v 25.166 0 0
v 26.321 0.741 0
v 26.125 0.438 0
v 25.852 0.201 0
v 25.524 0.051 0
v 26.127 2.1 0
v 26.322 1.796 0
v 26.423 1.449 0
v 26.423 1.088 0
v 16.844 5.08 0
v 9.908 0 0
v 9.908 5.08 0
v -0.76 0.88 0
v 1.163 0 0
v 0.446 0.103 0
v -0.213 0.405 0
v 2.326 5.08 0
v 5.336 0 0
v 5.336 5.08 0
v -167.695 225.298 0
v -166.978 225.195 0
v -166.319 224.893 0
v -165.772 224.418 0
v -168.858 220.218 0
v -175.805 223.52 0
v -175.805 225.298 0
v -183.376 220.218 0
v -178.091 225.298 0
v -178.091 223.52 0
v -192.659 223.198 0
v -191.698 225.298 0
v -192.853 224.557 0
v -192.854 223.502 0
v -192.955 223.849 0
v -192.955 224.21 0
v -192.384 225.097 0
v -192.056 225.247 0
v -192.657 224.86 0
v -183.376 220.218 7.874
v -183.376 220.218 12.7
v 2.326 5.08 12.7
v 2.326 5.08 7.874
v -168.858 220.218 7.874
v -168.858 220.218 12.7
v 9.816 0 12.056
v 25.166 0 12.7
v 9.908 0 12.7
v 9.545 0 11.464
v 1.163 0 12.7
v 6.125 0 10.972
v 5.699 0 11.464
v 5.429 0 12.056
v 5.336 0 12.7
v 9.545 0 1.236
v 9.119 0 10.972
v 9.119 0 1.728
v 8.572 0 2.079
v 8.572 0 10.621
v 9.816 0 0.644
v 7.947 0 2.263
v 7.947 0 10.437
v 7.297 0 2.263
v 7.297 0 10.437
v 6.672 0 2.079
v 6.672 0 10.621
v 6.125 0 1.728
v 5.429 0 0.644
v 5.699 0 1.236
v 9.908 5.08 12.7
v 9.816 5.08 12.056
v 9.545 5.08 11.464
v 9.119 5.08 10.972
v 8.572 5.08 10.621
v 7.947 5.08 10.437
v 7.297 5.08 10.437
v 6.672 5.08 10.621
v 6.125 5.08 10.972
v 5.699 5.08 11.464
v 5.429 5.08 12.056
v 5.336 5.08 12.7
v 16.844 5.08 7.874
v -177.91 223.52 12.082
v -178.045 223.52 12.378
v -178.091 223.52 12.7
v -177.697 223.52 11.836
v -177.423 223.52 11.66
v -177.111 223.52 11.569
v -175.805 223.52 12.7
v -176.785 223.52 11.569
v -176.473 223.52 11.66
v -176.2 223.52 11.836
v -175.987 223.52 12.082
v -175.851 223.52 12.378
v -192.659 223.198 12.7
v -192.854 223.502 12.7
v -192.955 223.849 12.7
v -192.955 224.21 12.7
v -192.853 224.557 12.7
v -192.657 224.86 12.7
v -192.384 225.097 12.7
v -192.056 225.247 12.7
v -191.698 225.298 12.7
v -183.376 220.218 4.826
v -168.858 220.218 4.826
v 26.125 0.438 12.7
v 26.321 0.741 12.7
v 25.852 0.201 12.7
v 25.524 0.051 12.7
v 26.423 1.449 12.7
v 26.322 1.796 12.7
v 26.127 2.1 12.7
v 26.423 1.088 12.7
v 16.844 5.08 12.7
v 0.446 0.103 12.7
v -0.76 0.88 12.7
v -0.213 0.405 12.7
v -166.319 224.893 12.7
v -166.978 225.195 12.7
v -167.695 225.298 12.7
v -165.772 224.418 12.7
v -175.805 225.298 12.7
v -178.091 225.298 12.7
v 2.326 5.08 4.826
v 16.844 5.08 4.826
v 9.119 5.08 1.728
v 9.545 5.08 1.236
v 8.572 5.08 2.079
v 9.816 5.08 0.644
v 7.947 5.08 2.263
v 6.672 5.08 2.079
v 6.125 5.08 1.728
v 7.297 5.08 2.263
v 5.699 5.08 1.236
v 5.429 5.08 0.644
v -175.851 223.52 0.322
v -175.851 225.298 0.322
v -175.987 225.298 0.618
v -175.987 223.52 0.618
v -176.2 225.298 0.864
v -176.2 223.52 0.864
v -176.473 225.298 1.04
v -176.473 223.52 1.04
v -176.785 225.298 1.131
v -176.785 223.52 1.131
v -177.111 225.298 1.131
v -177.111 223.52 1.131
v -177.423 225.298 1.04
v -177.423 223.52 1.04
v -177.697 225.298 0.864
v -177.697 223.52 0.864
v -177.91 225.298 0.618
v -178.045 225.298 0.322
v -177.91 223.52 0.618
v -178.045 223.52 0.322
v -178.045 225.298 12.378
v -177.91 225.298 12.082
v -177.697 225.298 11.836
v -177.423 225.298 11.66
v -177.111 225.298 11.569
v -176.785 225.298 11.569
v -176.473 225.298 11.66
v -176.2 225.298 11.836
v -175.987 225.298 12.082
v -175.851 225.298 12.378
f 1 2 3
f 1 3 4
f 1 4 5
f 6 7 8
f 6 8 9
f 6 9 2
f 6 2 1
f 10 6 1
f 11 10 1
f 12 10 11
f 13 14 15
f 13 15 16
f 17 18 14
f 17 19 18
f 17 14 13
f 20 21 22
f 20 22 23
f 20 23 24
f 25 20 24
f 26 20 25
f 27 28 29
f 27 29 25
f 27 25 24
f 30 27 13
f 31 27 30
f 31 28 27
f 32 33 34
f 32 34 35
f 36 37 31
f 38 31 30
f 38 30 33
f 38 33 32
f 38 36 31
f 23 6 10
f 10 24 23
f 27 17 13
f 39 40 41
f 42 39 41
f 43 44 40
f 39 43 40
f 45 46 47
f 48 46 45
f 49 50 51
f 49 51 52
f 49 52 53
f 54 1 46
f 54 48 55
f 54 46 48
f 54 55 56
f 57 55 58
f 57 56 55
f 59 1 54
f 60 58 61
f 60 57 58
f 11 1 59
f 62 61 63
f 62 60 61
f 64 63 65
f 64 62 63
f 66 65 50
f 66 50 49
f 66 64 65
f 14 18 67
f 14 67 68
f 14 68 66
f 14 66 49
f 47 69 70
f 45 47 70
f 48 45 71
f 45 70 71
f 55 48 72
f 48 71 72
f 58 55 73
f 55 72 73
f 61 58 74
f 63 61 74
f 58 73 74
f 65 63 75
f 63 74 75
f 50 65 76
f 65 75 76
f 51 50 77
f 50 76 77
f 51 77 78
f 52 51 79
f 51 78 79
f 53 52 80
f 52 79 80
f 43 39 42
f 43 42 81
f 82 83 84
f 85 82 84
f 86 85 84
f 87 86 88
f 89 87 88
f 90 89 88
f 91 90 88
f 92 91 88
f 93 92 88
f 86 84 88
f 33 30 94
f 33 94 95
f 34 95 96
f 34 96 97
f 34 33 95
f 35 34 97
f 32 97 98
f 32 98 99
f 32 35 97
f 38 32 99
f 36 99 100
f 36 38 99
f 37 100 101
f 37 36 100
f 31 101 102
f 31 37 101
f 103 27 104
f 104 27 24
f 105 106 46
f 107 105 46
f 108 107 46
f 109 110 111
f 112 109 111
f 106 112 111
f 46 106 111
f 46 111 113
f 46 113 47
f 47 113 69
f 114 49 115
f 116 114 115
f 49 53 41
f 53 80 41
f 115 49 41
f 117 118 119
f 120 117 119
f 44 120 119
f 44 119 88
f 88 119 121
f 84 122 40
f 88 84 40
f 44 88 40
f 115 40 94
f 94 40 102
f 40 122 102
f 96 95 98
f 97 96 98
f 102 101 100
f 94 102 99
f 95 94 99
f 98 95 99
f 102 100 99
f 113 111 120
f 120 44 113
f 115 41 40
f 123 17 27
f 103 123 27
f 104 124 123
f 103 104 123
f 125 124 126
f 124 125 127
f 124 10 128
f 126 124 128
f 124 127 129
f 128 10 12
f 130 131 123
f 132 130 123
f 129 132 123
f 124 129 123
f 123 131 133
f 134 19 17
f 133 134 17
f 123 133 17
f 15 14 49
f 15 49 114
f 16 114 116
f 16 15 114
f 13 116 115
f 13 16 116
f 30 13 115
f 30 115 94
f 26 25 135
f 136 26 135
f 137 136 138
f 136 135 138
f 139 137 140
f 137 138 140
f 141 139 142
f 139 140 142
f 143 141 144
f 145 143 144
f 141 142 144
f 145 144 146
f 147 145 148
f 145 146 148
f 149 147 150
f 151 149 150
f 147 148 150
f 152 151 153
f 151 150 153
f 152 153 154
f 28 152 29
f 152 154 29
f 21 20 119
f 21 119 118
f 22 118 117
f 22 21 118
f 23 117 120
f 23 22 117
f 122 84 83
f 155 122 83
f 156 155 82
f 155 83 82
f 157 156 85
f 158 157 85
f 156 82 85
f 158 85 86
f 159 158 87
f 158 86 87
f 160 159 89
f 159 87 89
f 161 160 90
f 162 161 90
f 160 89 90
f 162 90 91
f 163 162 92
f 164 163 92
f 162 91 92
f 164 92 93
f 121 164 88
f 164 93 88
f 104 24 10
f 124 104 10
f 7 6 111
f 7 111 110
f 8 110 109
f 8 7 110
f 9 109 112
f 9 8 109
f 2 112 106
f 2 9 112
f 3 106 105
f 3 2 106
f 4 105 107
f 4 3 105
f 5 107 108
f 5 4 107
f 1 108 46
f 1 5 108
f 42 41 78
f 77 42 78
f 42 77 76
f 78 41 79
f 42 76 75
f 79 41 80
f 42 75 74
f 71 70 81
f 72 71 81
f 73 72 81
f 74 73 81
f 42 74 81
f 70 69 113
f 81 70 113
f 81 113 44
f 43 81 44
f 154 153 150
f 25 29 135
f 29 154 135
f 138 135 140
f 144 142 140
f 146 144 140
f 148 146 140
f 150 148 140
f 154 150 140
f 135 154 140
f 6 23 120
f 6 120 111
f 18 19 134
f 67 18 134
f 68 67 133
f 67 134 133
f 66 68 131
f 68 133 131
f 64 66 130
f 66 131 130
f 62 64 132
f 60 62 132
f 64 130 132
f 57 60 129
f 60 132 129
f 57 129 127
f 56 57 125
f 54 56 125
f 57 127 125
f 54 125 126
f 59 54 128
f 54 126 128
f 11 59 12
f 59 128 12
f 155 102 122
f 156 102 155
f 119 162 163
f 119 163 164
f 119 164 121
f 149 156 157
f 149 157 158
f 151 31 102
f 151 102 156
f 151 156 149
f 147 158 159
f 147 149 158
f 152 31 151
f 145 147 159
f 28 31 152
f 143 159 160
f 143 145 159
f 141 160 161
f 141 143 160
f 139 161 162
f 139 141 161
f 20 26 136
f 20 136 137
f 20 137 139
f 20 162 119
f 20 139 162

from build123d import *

# Parameters (mm, degrees)
BOSS_EXTRUDE1_DEPTH = 12.7
CUT_EXTRUDE1_DEPTH  = 4.826
CUT_EXTRUDE2_DEPTH  = 4.826
SKETCH5_R           = 1.143
CUT_EXTRUDE3_DEPTH  = 296.565841373
SKETCH6_R           = 2.286
CUT_EXTRUDE4_DEPTH  = 294.076685716


with BuildPart() as part:
    # Sketch1 → Boss-Extrude1 (new body)
    with BuildSketch(Plane.XY):
        with BuildLine():
            Line((-0.759864647, 0.880311666), (-192.659480012, 223.198155833))
            ThreePointArc((-192.659480012, 223.198155833), (-192.85282615, 224.556676606), (-191.698096292, 225.298))
            Line((-191.698096292, 225.298), (-167.694919671, 225.298))
            ThreePointArc((-167.694919671, 225.298), (-166.637566458, 225.067459717), (-165.772152229, 224.417688334))
            Line((-165.772152229, 224.417688334), (26.127463136, 2.099844167))
            ThreePointArc((26.127463136, 2.099844167), (26.320809274, 0.741323394), (25.166079416, 0))
            Line((25.166079416, 0), (1.162902795, 0))
            ThreePointArc((1.162902795, 0), (0.105549582, 0.230540283), (-0.759864647, 0.880311666))
        make_face()
    extrude(amount=BOSS_EXTRUDE1_DEPTH)

    # Sketch3 → Cut-Extrude1 (cut)
    with BuildSketch(Plane.XY.offset(12.7)):
        Polygon((-183.376334539, 220.218), (2.32580559, 5.08), (16.844317663, 5.08), (-168.857822466, 220.218), align=None)
    extrude(amount=-CUT_EXTRUDE1_DEPTH, mode=Mode.SUBTRACT)

    # Sketch4 → Cut-Extrude2 (cut)
    with BuildSketch(Plane(origin=(0, 0, 0), x_dir=(-1, 0, 0), z_dir=(0, 0, -1))):
        Polygon((183.376334539, 220.218), (168.857822466, 220.218), (-16.844317663, 5.08), (-2.32580559, 5.08), align=None)
    extrude(amount=-CUT_EXTRUDE2_DEPTH, mode=Mode.SUBTRACT)

    # Sketch5 → Cut-Extrude3 (cut, through all)
    with BuildSketch(Plane.XZ.offset(-223.52)):
        with Locations((-176.948152229, 0)):
            Circle(SKETCH5_R)
        with Locations((-176.948152229, 12.7)):
            Circle(SKETCH5_R)
    extrude(amount=-CUT_EXTRUDE3_DEPTH, mode=Mode.SUBTRACT)

    # Sketch6 → Cut-Extrude4 (cut, through all)
    with BuildSketch(Plane(origin=(0, 5.08, 0), x_dir=(1, 0, 0), z_dir=(0, 1, 0))):
        with Locations((7.622135353, -12.7)):
            Circle(SKETCH6_R)
        with Locations((7.622135353, 0)):
            Circle(SKETCH6_R)
    extrude(amount=-CUT_EXTRUDE4_DEPTH, mode=Mode.SUBTRACT)


solid = part.part
